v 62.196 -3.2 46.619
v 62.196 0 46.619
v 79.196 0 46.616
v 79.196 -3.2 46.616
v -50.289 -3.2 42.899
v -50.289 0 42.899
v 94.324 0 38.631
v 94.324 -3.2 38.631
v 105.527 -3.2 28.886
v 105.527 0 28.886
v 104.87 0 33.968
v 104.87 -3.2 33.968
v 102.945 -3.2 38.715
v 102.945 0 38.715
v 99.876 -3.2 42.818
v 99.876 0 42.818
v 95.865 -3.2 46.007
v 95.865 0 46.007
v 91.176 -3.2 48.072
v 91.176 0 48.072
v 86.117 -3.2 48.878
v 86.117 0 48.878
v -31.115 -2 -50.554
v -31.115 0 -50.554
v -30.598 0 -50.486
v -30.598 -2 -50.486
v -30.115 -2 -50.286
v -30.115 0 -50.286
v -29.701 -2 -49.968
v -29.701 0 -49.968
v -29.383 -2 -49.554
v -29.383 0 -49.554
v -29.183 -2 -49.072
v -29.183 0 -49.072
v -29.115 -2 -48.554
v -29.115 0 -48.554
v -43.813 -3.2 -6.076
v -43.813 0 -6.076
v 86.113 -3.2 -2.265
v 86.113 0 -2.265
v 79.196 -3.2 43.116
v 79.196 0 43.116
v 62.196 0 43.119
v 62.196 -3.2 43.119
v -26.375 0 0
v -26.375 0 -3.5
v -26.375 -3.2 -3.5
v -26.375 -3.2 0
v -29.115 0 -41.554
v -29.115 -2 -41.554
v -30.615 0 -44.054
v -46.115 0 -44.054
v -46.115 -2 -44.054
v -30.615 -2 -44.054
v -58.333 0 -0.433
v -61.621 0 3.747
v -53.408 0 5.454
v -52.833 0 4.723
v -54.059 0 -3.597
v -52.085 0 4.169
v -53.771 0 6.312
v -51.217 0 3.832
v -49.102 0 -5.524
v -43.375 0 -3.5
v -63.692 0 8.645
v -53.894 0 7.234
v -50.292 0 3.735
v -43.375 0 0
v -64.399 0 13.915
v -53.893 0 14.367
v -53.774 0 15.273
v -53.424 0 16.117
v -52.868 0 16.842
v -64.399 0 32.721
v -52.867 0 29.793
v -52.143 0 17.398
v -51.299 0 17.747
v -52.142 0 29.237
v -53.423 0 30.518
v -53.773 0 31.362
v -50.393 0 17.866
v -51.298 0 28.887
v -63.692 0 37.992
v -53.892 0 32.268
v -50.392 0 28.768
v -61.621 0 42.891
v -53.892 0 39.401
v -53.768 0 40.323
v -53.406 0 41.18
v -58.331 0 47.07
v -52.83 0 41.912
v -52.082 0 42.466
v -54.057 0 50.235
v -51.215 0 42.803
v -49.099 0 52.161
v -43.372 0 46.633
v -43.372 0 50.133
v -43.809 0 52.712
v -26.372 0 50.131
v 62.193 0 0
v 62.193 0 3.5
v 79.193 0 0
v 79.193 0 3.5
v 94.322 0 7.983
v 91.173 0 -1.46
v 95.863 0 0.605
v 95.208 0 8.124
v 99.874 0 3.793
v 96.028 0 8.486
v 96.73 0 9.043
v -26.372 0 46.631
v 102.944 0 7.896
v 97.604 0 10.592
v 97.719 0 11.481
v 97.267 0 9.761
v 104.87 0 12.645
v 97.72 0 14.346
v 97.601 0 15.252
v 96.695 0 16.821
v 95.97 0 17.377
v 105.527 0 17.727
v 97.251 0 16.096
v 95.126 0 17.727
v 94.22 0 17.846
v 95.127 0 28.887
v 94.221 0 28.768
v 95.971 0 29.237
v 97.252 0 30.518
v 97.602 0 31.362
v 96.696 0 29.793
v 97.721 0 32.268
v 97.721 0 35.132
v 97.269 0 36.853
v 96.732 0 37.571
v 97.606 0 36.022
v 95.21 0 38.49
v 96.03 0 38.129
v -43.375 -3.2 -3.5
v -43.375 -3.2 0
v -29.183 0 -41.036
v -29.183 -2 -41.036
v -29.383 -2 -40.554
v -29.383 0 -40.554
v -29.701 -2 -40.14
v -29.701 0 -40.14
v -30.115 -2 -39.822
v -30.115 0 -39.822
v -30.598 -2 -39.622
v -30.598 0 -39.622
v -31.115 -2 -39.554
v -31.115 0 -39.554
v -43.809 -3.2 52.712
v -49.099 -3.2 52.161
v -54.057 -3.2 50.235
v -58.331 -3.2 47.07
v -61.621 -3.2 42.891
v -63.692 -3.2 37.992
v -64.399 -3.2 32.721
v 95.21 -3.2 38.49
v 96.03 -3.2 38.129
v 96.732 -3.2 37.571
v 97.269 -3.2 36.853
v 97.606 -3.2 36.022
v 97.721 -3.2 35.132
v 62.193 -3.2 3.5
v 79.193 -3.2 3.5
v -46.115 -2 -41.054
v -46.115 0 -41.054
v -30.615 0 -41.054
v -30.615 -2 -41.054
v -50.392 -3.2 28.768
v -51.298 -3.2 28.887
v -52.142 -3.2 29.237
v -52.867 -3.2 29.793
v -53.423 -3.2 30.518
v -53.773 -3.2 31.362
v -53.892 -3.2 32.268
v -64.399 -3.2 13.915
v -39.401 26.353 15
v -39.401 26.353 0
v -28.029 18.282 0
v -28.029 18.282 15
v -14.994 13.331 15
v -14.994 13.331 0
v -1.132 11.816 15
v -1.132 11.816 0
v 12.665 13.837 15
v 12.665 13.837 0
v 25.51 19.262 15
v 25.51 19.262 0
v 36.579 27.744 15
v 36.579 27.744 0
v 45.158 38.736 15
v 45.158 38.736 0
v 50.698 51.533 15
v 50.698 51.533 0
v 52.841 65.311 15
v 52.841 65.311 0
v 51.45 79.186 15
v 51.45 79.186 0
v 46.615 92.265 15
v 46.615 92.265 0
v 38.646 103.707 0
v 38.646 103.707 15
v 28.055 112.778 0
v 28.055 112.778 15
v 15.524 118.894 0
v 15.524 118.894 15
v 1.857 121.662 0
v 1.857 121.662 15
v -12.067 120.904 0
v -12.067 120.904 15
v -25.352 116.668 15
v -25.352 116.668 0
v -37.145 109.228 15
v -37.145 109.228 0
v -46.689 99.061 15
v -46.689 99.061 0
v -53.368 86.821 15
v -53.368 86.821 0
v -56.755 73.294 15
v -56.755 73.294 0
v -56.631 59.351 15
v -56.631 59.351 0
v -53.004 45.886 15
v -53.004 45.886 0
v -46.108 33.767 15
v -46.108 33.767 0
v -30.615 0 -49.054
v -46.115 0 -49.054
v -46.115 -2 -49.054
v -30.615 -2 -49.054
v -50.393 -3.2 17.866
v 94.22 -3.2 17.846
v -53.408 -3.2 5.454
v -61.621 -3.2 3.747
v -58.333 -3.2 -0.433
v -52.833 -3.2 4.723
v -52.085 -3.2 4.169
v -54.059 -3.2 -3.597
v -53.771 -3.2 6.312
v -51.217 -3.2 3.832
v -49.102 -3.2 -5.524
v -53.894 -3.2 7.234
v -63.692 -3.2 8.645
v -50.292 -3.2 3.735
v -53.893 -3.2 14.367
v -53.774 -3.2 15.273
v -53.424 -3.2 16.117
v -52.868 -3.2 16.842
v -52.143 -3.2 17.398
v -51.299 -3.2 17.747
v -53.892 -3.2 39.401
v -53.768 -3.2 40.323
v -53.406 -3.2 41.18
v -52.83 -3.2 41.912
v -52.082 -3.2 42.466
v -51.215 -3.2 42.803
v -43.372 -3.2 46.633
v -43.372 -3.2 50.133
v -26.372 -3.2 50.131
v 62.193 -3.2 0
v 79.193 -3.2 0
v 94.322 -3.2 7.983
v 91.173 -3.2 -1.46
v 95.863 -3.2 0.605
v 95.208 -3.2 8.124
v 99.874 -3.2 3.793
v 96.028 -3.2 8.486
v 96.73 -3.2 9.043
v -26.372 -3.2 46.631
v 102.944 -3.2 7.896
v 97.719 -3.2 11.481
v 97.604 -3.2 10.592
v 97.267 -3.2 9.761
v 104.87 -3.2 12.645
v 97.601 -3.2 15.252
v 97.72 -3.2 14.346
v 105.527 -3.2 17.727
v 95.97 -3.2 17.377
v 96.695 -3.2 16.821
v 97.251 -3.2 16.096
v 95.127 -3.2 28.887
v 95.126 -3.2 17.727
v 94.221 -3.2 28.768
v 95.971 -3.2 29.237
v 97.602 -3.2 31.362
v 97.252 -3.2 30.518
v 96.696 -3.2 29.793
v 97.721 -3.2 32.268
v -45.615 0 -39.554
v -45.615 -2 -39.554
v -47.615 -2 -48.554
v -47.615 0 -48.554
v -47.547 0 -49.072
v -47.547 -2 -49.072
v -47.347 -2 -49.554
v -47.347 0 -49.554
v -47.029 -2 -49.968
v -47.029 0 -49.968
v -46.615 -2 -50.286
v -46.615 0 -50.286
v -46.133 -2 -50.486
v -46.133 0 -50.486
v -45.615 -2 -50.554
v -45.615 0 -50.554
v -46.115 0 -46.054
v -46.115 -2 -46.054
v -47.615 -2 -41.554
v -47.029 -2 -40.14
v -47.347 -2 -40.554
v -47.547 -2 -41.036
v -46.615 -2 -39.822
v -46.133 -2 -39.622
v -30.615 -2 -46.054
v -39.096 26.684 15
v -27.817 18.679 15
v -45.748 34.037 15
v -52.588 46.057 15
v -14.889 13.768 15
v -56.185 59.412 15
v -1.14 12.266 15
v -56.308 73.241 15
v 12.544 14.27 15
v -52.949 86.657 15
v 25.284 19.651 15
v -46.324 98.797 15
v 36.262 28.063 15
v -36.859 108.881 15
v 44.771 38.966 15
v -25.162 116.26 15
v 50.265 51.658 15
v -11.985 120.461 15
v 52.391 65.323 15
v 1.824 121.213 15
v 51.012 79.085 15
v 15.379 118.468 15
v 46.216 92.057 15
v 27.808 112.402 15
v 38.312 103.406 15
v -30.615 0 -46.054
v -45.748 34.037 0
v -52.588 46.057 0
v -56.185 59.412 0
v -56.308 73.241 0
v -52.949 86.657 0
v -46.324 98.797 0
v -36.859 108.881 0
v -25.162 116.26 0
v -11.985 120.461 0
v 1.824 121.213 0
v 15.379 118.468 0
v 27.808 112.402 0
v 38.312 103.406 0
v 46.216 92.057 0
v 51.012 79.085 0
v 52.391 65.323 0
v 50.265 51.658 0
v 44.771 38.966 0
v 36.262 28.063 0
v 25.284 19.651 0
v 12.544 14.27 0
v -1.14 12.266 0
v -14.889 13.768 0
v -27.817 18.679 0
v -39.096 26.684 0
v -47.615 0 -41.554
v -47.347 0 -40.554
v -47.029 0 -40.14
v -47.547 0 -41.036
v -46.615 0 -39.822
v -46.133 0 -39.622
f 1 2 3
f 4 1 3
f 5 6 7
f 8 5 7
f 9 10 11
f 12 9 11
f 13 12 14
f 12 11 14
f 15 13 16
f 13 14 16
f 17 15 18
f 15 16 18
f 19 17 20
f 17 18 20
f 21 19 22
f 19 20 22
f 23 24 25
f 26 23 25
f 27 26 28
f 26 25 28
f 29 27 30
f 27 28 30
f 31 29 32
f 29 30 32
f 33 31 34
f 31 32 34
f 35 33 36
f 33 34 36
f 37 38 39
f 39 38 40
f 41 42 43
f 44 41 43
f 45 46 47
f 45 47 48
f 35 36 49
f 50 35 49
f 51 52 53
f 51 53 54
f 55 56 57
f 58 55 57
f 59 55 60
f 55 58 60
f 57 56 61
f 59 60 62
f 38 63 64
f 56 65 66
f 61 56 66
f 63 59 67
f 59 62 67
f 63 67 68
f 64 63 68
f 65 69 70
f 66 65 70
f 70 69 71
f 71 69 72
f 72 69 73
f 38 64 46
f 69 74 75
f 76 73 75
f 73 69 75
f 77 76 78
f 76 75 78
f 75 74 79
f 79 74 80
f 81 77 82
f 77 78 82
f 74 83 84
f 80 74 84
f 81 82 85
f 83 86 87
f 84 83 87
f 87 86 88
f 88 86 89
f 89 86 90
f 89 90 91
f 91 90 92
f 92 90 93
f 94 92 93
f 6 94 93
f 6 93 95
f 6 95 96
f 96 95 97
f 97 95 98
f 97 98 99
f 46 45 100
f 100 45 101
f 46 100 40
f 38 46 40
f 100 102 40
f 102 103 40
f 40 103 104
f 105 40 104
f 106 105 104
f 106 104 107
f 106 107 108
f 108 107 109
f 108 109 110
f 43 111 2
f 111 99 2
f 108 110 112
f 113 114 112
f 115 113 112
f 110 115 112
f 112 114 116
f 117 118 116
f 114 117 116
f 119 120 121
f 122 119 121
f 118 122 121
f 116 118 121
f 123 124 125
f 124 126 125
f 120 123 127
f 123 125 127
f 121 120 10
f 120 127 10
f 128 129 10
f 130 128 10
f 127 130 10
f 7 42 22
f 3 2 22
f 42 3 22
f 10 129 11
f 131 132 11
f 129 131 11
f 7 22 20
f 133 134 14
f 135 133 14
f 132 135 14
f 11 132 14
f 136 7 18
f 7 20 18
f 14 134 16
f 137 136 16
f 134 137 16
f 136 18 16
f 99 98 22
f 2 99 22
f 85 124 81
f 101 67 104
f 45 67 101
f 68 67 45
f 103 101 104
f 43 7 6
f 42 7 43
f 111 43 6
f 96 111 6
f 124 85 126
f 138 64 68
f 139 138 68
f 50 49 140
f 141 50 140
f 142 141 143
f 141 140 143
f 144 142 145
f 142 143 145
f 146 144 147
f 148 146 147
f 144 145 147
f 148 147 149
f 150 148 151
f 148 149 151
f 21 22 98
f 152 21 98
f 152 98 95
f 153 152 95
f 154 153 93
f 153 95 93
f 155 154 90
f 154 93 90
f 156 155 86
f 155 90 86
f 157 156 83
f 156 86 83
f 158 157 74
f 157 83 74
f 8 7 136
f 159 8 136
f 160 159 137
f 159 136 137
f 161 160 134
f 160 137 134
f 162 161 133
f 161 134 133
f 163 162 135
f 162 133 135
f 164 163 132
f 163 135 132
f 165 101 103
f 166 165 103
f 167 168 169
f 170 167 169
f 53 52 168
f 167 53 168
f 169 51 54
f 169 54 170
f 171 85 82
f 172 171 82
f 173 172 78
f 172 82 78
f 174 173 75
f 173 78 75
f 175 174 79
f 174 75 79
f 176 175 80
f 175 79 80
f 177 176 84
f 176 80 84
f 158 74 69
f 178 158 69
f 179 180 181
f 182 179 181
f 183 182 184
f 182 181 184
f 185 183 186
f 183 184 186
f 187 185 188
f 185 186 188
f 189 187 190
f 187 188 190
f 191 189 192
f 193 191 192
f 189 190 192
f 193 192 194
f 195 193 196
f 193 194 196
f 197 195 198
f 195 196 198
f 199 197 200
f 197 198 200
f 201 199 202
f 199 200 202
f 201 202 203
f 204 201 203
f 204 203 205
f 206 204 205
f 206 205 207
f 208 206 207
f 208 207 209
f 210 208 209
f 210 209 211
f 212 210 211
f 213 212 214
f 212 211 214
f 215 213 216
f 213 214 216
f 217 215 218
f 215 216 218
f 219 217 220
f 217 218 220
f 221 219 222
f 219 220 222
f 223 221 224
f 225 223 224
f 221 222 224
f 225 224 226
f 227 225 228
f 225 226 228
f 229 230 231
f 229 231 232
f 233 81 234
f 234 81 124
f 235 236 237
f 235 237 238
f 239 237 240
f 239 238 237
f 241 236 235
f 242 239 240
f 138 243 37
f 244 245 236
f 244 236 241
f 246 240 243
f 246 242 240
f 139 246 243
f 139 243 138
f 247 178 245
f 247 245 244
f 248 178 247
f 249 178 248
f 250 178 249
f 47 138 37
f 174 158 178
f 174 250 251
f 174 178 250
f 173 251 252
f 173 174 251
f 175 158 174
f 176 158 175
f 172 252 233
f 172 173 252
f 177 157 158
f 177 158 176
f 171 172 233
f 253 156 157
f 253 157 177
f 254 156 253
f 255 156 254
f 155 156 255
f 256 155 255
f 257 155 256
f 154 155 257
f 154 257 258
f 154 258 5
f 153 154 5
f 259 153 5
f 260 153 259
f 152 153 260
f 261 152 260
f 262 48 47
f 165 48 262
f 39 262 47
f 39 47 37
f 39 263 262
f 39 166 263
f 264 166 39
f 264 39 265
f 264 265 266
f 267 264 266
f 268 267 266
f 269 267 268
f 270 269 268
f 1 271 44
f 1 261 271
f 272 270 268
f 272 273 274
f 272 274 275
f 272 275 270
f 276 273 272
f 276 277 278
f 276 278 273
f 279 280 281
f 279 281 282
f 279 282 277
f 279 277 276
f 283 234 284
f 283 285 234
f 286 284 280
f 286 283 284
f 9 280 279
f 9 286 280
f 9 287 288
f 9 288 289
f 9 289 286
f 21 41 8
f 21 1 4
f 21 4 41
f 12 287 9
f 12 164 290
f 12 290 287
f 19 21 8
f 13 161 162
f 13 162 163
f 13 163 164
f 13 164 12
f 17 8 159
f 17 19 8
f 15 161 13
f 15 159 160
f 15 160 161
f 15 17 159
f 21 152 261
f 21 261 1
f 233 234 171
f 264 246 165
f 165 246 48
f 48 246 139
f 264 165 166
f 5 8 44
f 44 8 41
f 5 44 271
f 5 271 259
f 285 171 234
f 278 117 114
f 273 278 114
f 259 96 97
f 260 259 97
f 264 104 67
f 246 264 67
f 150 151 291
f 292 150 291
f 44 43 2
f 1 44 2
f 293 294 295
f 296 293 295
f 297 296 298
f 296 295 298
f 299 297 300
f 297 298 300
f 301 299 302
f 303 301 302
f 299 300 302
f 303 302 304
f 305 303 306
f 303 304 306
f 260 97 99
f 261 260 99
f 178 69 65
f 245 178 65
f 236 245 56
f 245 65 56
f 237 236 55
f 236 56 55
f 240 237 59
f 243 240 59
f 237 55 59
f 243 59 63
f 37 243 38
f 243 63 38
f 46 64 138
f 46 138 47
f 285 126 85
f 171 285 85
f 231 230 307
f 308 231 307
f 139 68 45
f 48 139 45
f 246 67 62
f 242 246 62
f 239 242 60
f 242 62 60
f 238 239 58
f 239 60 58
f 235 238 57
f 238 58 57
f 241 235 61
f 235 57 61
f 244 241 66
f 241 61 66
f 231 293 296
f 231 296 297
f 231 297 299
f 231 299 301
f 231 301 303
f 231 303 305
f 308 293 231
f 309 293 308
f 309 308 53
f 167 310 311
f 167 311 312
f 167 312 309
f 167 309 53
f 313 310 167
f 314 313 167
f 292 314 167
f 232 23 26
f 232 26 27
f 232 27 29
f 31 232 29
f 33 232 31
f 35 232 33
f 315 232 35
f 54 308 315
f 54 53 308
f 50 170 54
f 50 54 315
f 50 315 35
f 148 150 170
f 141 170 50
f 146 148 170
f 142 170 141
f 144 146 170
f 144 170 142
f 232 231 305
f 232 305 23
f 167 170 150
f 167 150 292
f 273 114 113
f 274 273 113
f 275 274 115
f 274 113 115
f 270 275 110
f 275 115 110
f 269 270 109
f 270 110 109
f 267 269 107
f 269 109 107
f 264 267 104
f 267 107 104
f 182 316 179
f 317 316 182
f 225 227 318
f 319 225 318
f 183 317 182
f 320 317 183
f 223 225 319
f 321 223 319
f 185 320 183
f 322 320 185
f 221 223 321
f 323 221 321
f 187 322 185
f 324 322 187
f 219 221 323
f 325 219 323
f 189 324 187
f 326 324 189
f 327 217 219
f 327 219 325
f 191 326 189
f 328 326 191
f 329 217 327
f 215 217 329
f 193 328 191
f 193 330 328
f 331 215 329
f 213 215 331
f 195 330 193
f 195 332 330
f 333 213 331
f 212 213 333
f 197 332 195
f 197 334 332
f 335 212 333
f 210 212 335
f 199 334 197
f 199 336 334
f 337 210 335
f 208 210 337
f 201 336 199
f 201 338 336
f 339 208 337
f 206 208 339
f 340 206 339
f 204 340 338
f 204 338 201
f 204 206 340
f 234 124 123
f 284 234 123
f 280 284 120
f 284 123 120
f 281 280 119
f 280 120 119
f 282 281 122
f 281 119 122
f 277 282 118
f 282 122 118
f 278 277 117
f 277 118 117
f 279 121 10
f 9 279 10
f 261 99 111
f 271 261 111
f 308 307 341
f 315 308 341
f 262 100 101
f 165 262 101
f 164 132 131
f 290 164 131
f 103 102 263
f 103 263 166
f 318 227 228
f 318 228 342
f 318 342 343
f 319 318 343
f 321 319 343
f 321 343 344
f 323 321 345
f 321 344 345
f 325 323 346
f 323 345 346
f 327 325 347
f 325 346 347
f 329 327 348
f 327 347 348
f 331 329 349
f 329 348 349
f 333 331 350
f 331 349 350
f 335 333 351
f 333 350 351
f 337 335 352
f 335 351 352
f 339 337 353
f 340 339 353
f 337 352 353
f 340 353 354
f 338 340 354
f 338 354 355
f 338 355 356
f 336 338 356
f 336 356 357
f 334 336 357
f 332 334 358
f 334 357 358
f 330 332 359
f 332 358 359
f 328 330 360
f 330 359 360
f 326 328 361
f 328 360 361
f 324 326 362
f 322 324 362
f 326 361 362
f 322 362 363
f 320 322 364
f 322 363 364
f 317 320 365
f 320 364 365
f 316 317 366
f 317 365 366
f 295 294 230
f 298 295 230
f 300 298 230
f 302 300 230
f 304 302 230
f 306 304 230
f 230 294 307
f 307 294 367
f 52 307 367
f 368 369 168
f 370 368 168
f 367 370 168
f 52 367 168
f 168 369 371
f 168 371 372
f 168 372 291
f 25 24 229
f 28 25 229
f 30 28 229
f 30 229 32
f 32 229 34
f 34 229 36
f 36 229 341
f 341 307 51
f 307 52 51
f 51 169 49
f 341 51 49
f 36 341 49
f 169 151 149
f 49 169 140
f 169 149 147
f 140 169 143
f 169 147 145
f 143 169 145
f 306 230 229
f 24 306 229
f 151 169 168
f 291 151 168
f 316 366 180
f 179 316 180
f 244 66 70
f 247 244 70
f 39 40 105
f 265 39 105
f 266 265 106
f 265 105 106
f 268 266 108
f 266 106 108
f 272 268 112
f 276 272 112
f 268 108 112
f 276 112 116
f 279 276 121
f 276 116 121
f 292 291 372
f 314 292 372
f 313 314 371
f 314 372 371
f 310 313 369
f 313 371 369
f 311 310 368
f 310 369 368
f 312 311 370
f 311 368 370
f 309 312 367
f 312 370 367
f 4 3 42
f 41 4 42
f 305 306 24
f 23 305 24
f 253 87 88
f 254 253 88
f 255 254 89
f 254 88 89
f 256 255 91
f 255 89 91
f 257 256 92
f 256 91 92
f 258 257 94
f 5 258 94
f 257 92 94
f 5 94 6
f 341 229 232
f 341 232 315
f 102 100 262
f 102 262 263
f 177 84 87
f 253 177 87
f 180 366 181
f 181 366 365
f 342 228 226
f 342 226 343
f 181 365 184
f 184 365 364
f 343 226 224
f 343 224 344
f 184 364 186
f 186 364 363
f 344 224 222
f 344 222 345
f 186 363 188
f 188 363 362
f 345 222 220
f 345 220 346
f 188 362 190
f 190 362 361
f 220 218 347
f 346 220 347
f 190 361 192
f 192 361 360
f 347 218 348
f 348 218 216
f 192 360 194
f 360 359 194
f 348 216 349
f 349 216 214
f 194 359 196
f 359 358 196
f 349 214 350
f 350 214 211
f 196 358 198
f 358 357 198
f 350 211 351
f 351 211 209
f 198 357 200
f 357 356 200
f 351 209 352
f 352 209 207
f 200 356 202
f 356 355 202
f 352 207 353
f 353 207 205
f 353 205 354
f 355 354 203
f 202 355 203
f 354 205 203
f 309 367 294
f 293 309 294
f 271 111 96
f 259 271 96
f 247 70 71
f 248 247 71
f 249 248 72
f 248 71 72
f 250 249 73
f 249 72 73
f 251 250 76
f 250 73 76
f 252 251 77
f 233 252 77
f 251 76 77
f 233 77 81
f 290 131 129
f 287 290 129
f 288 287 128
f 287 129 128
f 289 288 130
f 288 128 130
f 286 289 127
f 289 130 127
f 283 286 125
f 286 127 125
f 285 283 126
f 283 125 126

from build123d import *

# Parameters (mm, degrees)
F0_W     = 17
F0_H     = 3.5
F1_DEPTH = 3.2
F2_W     = 15.5
F2_H     = 3
F3_DEPTH = 2
F5_DEPTH = 15


with BuildPart() as f1:
    # F0 (on Front) → F1 (new body)
    with BuildSketch(Plane.XZ):
        with BuildLine():
            ThreePointArc((-43.80942, 52.71233), (-58.331431, 47.07027), (-64.399472, 32.721036))
            Line((-64.399472, 32.721036), (-64.399472, 23.318184))
            Line((-64.399472, 23.318184), (105.526528, 23.306376))
            Line((105.526528, 23.306376), (105.526528, 28.886212))
            ThreePointArc((105.526528, 28.886212), (99.875762, 42.818171), (86.11658, 48.877506))
            Line((86.11658, 48.877506), (-43.80942, 52.71233))
        make_face()
        Polygon((-26.371657, 50.131083), (-26.372144, 46.631083), (-43.372144, 46.633446), (-43.371657, 50.133446), align=None, mode=Mode.SUBTRACT)
        with BuildLine():
            ThreePointArc((94.324163, 38.6309), (96.73202, 37.570517), (97.720904, 35.132424))
            Line((97.720904, 35.132424), (97.720904, 32.268037))
            ThreePointArc((97.720904, 32.268037), (96.695777, 29.793163), (94.220904, 28.768037))
            Line((94.220904, 28.768037), (-50.392183, 28.768037))
            ThreePointArc((-50.392183, 28.768037), (-52.867057, 29.793163), (-53.892183, 32.268037))
            Line((-53.892183, 32.268037), (-53.892183, 39.400744))
            ThreePointArc((-53.892183, 39.400744), (-52.830276, 41.91186), (-50.288924, 42.899221))
            Line((-50.288924, 42.899221), (94.324163, 38.6309))
        make_face(mode=Mode.SUBTRACT)
        Polygon((62.195953, 43.118775), (62.196439, 46.618775), (79.196439, 46.616412), (79.195953, 43.116412), align=None, mode=Mode.SUBTRACT)
        with BuildLine():
            Line((105.526528, 23.306376), (-64.399472, 23.318184))
            Line((-64.399472, 23.318184), (-64.399472, 13.915332))
            ThreePointArc((-64.399472, 13.915332), (-58.332734, -0.432637), (-43.81305, -6.076069))
            Line((-43.81305, -6.076069), (86.112949, -2.26486))
            ThreePointArc((86.112949, -2.26486), (99.874497, 3.79328), (105.526528, 17.726541))
            Line((105.526528, 17.726541), (105.526528, 23.306376))
        make_face()
        with Locations((-34.875384, -1.75)):
            Rectangle(F0_W, F0_H, mode=Mode.SUBTRACT)
        with Locations((70.6932, 1.75)):
            Rectangle(F0_W, F0_H, mode=Mode.SUBTRACT)
        with BuildLine():
            Line((-50.392941, 17.866385), (94.220145, 17.846288))
            ThreePointArc((94.220145, 17.846288), (96.694876, 16.820817), (97.719658, 14.345801))
            Line((97.719658, 14.345801), (97.71926, 11.481414))
            ThreePointArc((97.71926, 11.481414), (96.730038, 9.043459), (94.322033, 7.98341))
            Line((94.322033, 7.98341), (-50.291646, 3.735186))
            ThreePointArc((-50.291646, 3.735186), (-52.83286, 4.7229), (-53.894419, 7.234163))
            Line((-53.894419, 7.234163), (-53.893427, 14.366871))
            ThreePointArc((-53.893427, 14.366871), (-52.867957, 16.841602), (-50.392941, 17.866385))
        make_face(mode=Mode.SUBTRACT)
    extrude(amount=F1_DEPTH)


with BuildPart() as f3:
    # F2 (on Front) → F3 (new body)
    with BuildSketch(Plane.XZ):
        with BuildLine():
            Line((-31.115178, -39.553889), (-45.615178, -39.553889))
            ThreePointArc((-45.615178, -39.553889), (-47.029391, -40.139676), (-47.615178, -41.553889))
            Line((-47.615178, -41.553889), (-47.615178, -48.553889))
            ThreePointArc((-47.615178, -48.553889), (-47.029391, -49.968103), (-45.615178, -50.553889))
            Line((-45.615178, -50.553889), (-31.115178, -50.553889))
            ThreePointArc((-31.115178, -50.553889), (-29.700964, -49.968103), (-29.115178, -48.553889))
            Line((-29.115178, -48.553889), (-29.115178, -41.553889))
            ThreePointArc((-29.115178, -41.553889), (-29.700964, -40.139676), (-31.115178, -39.553889))
        make_face()
        with Locations((-38.365178, -47.553889)):
            Rectangle(F2_W, F2_H, mode=Mode.SUBTRACT)
        with Locations((-38.365178, -42.553889)):
            Rectangle(F2_W, F2_H, mode=Mode.SUBTRACT)
    extrude(amount=F3_DEPTH)


with BuildPart() as f5:
    # F4 (on Top) → F5 (new body)
    with BuildSketch(Plane.XY):
        with BuildLine():
            Line((-39.095646, 26.683898), (-39.400516, 26.352908))
            ThreePointArc((-39.400516, 26.352908), (38.645815, 103.707479), (-46.108128, 33.766585))
            Line((-46.108128, 33.766585), (-45.748378, 34.036918))
            ThreePointArc((-45.748378, 34.036918), (38.312124, 103.405568), (-39.095646, 26.683898))
        make_face()
    extrude(amount=F5_DEPTH)


solid = Compound([f1.part, f3.part, f5.part])
